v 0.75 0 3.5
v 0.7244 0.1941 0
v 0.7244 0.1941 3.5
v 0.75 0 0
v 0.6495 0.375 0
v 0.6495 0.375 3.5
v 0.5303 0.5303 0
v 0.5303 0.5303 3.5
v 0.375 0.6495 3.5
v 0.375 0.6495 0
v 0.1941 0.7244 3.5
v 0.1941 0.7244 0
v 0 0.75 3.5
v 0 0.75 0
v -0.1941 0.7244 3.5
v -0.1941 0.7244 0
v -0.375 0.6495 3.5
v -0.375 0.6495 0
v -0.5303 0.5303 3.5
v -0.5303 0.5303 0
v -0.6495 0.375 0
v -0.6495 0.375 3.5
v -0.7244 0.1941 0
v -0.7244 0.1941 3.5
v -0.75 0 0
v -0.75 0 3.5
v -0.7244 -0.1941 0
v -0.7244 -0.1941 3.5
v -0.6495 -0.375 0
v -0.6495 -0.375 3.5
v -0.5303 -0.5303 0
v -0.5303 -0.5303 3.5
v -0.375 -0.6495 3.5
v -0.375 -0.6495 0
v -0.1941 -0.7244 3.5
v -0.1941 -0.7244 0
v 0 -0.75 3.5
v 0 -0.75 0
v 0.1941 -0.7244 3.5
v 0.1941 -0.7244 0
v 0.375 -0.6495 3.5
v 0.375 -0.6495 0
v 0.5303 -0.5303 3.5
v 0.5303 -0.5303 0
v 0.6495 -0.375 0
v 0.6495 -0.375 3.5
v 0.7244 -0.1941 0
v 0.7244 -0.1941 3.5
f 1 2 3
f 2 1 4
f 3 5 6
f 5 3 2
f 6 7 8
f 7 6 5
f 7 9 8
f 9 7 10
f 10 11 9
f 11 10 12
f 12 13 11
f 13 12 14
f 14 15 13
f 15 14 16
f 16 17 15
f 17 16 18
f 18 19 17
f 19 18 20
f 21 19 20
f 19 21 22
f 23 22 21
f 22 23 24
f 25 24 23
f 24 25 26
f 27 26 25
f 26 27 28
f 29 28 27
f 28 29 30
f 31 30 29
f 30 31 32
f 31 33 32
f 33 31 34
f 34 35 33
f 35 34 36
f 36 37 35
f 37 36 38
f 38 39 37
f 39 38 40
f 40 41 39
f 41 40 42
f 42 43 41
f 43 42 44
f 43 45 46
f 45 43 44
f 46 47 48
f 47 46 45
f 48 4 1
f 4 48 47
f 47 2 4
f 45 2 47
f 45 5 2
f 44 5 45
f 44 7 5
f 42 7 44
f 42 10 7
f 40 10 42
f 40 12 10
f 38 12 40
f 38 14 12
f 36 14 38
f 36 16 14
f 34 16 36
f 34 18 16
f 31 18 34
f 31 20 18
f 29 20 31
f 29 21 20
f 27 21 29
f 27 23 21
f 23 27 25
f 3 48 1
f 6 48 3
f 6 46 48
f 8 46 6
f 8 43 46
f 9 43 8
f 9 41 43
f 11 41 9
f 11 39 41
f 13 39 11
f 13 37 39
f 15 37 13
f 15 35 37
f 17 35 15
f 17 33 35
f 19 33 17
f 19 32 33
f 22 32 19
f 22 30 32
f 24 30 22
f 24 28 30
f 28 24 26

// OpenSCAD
// part_id: cp8
// name: Pin D1.5
// source_drawing_ids: DRW-005
// units: mm
// revision: 0.1
// SPDX-License-Identifier: MIT

module part_cp8(d = 1.5, h = 3.5) {
    cylinder(d = d, h = h, center = false, $fn = 24);
}

// ---- "main guard" ----
// Default to previewing when opened directly:
if (is_undef(__LIB_MODE__)) {
    part_cp8();
}
